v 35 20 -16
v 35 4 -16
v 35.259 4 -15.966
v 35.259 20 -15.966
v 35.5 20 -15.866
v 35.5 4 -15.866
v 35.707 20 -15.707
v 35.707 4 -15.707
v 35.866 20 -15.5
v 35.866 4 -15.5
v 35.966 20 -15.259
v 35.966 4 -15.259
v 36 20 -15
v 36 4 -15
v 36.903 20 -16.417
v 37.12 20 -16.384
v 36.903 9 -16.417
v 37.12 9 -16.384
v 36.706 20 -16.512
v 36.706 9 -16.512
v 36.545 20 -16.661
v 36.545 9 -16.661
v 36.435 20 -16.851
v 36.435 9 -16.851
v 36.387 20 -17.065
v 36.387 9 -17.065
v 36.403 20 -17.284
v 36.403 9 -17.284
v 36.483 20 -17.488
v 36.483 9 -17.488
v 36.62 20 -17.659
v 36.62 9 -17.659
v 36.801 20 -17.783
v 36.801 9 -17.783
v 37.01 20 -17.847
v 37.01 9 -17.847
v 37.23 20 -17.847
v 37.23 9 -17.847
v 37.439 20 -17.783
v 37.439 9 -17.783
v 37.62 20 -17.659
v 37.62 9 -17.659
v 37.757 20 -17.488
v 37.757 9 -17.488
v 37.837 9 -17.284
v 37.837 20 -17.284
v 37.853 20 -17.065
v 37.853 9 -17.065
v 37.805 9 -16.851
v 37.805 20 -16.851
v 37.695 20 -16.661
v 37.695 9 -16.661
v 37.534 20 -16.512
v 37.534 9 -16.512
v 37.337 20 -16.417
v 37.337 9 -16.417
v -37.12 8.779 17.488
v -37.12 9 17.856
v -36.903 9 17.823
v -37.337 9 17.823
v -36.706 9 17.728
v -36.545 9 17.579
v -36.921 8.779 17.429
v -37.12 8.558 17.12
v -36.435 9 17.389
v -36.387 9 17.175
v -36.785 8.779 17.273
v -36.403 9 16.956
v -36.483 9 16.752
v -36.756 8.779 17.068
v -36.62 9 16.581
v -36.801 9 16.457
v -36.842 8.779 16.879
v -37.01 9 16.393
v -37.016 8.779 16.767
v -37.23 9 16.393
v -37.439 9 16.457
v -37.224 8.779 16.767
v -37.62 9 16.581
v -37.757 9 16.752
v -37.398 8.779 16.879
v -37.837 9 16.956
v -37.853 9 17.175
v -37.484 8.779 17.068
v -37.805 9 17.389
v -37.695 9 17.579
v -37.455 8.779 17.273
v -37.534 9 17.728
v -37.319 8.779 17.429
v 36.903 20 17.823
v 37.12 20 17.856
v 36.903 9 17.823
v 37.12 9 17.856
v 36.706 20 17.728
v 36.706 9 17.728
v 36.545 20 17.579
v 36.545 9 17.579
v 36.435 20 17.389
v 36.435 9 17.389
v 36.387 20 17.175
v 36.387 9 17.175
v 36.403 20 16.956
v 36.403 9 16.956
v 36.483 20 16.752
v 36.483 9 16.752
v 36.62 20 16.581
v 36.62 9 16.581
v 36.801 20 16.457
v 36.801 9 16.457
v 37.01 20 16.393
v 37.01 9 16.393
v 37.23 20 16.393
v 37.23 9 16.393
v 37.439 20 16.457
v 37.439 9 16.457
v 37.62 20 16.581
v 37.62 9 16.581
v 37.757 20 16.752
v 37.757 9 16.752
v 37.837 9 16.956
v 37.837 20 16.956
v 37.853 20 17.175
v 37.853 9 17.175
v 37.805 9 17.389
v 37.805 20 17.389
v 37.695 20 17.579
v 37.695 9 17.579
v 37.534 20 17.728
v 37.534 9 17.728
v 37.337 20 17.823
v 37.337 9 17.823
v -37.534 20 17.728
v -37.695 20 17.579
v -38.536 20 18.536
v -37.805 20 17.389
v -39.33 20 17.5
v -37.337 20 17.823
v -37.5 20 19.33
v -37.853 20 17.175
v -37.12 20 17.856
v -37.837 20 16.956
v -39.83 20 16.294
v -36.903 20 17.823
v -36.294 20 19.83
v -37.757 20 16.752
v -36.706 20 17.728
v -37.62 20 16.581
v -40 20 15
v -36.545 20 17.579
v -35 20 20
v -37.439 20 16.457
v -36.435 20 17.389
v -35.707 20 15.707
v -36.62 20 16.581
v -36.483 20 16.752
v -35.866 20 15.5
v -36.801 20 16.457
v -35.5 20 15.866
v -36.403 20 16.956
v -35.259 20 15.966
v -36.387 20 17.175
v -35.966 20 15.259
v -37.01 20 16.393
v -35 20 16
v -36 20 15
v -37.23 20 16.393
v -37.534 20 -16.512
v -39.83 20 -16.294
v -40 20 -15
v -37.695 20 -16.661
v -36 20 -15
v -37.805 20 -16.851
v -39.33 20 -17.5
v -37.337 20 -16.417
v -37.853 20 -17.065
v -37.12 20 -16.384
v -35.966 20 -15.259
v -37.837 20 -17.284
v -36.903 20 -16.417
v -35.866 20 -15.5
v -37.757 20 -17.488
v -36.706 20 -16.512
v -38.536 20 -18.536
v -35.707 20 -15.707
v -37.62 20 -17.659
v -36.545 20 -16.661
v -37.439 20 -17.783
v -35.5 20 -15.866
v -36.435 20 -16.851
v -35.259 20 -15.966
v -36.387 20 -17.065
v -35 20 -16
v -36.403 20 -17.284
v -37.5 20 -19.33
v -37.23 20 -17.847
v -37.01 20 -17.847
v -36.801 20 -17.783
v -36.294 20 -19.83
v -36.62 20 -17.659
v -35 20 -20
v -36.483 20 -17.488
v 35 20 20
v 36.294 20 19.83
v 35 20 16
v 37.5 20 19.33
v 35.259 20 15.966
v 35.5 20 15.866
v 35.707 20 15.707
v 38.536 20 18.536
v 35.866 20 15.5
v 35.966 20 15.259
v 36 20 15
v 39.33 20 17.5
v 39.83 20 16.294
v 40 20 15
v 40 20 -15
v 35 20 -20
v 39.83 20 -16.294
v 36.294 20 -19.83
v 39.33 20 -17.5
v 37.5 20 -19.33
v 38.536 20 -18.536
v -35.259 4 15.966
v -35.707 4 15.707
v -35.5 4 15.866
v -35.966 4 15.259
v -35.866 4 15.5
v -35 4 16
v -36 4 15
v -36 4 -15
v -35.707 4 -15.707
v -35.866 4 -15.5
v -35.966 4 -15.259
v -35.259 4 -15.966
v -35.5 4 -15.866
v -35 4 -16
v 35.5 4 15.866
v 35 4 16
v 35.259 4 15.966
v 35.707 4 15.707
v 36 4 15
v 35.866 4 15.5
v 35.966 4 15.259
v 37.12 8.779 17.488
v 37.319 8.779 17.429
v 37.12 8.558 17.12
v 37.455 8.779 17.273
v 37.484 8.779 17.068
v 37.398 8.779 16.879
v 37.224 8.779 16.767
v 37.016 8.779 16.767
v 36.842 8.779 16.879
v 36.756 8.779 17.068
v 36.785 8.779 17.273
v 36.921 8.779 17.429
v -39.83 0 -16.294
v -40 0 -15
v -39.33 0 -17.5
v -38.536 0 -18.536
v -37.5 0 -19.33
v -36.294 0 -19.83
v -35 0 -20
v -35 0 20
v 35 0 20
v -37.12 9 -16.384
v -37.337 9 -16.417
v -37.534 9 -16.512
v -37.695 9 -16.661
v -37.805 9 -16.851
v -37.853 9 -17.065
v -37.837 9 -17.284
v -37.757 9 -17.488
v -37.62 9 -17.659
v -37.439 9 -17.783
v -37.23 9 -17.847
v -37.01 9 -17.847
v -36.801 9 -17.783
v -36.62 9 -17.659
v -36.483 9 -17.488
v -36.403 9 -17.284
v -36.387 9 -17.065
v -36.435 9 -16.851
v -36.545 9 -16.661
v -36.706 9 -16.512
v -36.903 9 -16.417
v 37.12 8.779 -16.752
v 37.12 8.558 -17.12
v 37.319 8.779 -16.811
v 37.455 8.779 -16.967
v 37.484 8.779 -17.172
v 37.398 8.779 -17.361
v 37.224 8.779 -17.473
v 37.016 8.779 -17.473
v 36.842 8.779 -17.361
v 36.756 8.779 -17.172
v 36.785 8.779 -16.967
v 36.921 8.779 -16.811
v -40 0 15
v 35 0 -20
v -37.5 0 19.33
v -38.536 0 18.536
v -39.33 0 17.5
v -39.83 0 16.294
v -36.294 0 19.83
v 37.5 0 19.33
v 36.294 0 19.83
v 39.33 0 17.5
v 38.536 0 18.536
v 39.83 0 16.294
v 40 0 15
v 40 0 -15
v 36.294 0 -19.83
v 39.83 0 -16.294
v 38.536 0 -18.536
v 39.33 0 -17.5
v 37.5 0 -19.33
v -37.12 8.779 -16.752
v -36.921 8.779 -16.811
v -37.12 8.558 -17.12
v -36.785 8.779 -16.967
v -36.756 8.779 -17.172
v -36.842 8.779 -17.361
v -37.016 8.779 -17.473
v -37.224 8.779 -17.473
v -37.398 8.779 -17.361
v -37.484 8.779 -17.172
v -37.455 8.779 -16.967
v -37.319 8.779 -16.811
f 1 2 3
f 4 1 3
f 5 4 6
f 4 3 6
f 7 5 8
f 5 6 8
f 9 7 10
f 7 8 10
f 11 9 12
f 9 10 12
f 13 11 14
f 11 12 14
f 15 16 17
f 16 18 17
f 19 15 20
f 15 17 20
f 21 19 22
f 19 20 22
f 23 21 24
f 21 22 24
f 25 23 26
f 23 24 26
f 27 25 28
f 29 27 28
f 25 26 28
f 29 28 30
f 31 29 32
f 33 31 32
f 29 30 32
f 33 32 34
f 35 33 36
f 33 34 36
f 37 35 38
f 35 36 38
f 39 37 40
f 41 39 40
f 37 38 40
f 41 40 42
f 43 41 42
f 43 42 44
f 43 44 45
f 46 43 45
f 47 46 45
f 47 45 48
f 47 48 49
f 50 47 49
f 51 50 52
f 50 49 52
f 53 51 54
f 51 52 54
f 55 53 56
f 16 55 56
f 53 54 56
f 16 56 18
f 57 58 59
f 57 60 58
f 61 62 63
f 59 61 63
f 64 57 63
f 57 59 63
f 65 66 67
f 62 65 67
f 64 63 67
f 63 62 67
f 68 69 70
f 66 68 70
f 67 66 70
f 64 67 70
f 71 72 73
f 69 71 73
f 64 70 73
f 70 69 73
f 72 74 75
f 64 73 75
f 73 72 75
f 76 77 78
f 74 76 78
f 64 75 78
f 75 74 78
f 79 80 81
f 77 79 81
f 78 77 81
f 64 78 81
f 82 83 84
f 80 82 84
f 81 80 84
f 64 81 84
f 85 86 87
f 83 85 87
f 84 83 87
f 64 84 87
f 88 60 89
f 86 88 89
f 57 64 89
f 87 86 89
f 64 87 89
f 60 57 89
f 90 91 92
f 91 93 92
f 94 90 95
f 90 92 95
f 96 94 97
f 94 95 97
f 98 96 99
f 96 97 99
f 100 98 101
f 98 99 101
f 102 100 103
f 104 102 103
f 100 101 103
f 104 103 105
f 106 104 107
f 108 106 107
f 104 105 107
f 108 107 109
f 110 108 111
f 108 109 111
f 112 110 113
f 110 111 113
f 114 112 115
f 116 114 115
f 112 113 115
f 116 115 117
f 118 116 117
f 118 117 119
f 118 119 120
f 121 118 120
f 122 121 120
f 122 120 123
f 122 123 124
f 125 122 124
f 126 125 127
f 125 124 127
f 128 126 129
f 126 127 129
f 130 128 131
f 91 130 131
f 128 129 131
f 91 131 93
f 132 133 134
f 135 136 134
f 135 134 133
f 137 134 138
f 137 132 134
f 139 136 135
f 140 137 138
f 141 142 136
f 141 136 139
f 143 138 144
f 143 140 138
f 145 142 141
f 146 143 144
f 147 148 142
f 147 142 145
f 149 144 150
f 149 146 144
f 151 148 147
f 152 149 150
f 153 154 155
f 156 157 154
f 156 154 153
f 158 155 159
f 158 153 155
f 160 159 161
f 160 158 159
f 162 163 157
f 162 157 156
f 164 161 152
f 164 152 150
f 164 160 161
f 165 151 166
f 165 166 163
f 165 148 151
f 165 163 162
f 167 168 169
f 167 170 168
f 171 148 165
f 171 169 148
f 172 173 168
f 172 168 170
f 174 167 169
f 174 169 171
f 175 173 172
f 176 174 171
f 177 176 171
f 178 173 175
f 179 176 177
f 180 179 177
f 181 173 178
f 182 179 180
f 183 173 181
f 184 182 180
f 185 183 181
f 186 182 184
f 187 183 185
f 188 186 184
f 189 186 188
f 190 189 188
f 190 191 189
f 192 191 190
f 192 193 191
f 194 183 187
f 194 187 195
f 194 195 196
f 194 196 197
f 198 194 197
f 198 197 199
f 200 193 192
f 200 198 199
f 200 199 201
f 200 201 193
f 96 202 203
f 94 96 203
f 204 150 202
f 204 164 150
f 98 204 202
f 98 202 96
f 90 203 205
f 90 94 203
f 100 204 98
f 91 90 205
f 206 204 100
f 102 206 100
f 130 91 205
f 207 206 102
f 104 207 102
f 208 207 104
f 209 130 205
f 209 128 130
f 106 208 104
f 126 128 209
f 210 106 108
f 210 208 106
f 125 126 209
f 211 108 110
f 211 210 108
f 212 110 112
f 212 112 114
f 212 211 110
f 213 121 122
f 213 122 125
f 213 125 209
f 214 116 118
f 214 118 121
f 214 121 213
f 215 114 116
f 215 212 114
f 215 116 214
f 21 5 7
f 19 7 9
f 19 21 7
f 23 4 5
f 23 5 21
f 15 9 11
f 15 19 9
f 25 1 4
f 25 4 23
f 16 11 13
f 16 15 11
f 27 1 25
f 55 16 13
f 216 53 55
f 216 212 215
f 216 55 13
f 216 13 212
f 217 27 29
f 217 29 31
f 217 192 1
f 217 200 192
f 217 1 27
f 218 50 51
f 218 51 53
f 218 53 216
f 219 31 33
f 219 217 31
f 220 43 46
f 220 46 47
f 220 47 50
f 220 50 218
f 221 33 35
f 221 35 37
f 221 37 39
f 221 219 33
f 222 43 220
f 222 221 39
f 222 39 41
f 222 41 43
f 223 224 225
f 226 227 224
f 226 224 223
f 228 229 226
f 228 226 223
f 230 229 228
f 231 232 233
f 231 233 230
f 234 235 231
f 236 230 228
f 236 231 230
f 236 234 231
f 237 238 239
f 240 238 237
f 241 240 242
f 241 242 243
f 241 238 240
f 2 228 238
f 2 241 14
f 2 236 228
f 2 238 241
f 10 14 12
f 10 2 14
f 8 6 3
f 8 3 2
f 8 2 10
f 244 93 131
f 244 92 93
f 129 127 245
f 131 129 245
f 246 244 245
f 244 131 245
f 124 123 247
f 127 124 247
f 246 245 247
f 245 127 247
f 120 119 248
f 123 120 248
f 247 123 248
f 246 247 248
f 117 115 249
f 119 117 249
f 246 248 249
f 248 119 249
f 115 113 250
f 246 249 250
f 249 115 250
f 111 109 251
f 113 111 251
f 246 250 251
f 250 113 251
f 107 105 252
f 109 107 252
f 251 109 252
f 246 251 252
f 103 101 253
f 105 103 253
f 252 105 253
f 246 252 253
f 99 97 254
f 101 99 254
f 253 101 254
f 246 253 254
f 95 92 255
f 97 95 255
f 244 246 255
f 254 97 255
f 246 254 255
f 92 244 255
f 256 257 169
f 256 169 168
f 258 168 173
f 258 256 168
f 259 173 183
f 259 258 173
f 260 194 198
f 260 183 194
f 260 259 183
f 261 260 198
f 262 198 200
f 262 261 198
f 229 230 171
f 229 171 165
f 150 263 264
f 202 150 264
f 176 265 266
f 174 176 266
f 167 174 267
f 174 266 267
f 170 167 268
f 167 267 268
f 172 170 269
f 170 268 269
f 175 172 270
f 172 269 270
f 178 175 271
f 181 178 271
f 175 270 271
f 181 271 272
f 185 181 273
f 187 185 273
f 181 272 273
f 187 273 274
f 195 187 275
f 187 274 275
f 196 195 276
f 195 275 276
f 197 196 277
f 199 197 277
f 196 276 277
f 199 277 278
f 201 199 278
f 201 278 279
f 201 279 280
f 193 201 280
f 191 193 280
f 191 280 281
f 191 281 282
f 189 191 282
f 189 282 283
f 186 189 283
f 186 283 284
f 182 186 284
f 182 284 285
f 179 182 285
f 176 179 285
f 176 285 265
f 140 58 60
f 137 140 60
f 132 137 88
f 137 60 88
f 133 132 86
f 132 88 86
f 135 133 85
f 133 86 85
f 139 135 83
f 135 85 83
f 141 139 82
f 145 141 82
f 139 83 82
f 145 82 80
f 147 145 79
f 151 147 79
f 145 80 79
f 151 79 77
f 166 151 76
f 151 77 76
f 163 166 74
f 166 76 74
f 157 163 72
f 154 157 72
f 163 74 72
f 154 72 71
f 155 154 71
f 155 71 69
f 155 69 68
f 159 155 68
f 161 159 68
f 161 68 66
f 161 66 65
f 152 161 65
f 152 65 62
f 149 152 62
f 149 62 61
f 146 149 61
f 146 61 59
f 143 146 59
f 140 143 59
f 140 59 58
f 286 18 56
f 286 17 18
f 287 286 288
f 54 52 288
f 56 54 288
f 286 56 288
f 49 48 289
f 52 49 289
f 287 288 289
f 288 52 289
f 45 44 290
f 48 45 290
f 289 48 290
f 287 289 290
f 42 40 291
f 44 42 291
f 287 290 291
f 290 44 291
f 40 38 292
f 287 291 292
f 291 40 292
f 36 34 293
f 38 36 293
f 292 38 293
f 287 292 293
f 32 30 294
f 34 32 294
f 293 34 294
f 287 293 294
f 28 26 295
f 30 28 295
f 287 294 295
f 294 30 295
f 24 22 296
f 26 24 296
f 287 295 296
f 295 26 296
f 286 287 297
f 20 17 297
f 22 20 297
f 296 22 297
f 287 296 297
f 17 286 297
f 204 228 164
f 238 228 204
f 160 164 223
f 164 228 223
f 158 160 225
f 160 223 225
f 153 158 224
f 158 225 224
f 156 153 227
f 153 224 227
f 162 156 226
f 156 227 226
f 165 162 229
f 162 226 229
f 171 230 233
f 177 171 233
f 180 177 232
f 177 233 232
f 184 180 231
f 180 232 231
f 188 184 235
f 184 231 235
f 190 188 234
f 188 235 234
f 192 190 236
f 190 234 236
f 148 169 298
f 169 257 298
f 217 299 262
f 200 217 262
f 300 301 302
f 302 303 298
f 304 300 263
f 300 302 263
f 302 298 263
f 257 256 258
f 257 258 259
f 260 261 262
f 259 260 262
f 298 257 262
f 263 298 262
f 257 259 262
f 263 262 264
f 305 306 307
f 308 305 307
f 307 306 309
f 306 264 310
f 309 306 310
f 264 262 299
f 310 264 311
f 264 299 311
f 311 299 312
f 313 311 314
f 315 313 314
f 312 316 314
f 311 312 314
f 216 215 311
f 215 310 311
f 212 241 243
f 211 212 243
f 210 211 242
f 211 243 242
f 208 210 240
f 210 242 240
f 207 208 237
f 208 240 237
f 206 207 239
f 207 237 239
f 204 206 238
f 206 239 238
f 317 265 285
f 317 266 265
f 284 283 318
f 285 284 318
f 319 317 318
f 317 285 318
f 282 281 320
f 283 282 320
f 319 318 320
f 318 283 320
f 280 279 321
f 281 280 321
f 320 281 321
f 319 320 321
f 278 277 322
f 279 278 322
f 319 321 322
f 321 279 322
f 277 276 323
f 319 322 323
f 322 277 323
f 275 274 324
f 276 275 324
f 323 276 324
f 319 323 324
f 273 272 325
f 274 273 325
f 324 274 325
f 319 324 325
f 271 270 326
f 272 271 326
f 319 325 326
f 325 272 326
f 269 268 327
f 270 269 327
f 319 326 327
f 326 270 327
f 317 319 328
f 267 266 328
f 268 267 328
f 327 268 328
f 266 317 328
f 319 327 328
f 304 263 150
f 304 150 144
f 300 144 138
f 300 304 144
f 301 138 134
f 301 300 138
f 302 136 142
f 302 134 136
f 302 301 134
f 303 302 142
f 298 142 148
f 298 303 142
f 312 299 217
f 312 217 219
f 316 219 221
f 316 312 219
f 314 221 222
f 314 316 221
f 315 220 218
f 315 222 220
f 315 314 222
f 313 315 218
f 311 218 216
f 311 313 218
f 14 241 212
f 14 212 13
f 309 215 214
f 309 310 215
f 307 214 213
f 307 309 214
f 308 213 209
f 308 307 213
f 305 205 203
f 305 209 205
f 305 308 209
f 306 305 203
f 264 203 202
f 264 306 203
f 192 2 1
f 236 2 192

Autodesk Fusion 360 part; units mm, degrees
sketch "Sketch1" plane through (0, 0, 0) normal (0, 1, 0) x (1, 0, 0)
  line L0 (35, 20) -> (-35, 20)
  line L1 (-40, 15) -> (-40, -15)
  line L2 (-35, -20) -> (35, -20)
  line L3 (40, -15) -> (40, 15)
  line L4 (40, 20) -> (-40, -20) construction
  line L5 (-40, 20) -> (40, -20) construction
  arc A0 (-35, 20) -> (-40, 15) centre (-35, 15) ccw
  arc A1 (40, 15) -> (35, 20) centre (35, 15) ccw
  arc A2 (35, -20) -> (40, -15) centre (35, -15) ccw
  arc A3 (-40, -15) -> (-35, -20) centre (-35, -15) ccw
  line L6 (-36, 15) -> (-36, -15)
  arc A4 (-36, -15) -> (-35, -16) centre (-35, -15) ccw
  line L7 (-35, -16) -> (35, -16)
  arc A5 (35, -16) -> (36, -15) centre (35, -15) ccw
  line L8 (36, -15) -> (36, 15)
  arc A6 (36, 15) -> (35, 16) centre (35, 15) ccw
  line L9 (35, 16) -> (-35, 16)
  arc A7 (-35, 16) -> (-36, 15) centre (-35, 15) ccw
  dimension "d1" = 80
  dimension "d2" = 40
  dimension "d3" = 5
  dimension "d4" = -4
extrude "Extrude1" add sketch "Sketch1" along normal blind 4 contours L6 A4 L7 A5 L8 A6 L9 A7
extrude "Extrude2" add sketch "Sketch1" along normal blind 20
sketch "Sketch2" plane through (0, 20, 0) normal (0, 1, 0) x (-1, 0, 0)
  arc A0 (35, -16) -> (36, -15) centre (35, -15) ccw
  line L0 (35, -16) -> (-35, -16)
  arc A1 (-36, -15) -> (-35, -16) centre (-35, -15) ccw
  line L1 (-36, -15) -> (-36, 15)
  arc A2 (-35, 16) -> (-36, 15) centre (-35, 15) ccw
  line L2 (-35, 16) -> (35, 16)
  arc A3 (36, 15) -> (35, 16) centre (35, 15) ccw
  line L3 (36, 15) -> (36, -15)
  arc A4 (40, 15) -> (35, 20) centre (35, 15) ccw
  line L4 (35, 20) -> (-35, 20)
  arc A5 (-35, 20) -> (-40, 15) centre (-35, 15) ccw
  line L5 (-40, 15) -> (-40, -15)
  arc A6 (-40, -15) -> (-35, -20) centre (-35, -15) ccw
  line L6 (-35, -20) -> (35, -20)
  arc A7 (35, -20) -> (40, -15) centre (35, -15) ccw
  line L7 (40, -15) -> (40, 15)
  line L8 (37.12, 17.12) -> (-37.12, 17.12)
  line L9 (-37.12, 17.12) -> (-37.12, -17.12)
  line L10 (-37.12, -17.12) -> (37.12, -17.12)
  line L11 (37.12, -17.12) -> (37.12, 17.12)
  line L12 (37.12, 17.12) -> (-37.12, -17.12) construction
  line L13 (-37.12, 17.12) -> (37.12, -17.12) construction
  dimension "d9" = 74.24
  dimension "d10" = 34.24
hole "Hole1" at (37.12, 20, 17.12) at (-37.12, 20, 17.12) at (-37.12, 20, -17.12) at (37.12, 20, -17.12) direction (0, -1, 0) diameter 1.471 depth 11 tip angle 118
